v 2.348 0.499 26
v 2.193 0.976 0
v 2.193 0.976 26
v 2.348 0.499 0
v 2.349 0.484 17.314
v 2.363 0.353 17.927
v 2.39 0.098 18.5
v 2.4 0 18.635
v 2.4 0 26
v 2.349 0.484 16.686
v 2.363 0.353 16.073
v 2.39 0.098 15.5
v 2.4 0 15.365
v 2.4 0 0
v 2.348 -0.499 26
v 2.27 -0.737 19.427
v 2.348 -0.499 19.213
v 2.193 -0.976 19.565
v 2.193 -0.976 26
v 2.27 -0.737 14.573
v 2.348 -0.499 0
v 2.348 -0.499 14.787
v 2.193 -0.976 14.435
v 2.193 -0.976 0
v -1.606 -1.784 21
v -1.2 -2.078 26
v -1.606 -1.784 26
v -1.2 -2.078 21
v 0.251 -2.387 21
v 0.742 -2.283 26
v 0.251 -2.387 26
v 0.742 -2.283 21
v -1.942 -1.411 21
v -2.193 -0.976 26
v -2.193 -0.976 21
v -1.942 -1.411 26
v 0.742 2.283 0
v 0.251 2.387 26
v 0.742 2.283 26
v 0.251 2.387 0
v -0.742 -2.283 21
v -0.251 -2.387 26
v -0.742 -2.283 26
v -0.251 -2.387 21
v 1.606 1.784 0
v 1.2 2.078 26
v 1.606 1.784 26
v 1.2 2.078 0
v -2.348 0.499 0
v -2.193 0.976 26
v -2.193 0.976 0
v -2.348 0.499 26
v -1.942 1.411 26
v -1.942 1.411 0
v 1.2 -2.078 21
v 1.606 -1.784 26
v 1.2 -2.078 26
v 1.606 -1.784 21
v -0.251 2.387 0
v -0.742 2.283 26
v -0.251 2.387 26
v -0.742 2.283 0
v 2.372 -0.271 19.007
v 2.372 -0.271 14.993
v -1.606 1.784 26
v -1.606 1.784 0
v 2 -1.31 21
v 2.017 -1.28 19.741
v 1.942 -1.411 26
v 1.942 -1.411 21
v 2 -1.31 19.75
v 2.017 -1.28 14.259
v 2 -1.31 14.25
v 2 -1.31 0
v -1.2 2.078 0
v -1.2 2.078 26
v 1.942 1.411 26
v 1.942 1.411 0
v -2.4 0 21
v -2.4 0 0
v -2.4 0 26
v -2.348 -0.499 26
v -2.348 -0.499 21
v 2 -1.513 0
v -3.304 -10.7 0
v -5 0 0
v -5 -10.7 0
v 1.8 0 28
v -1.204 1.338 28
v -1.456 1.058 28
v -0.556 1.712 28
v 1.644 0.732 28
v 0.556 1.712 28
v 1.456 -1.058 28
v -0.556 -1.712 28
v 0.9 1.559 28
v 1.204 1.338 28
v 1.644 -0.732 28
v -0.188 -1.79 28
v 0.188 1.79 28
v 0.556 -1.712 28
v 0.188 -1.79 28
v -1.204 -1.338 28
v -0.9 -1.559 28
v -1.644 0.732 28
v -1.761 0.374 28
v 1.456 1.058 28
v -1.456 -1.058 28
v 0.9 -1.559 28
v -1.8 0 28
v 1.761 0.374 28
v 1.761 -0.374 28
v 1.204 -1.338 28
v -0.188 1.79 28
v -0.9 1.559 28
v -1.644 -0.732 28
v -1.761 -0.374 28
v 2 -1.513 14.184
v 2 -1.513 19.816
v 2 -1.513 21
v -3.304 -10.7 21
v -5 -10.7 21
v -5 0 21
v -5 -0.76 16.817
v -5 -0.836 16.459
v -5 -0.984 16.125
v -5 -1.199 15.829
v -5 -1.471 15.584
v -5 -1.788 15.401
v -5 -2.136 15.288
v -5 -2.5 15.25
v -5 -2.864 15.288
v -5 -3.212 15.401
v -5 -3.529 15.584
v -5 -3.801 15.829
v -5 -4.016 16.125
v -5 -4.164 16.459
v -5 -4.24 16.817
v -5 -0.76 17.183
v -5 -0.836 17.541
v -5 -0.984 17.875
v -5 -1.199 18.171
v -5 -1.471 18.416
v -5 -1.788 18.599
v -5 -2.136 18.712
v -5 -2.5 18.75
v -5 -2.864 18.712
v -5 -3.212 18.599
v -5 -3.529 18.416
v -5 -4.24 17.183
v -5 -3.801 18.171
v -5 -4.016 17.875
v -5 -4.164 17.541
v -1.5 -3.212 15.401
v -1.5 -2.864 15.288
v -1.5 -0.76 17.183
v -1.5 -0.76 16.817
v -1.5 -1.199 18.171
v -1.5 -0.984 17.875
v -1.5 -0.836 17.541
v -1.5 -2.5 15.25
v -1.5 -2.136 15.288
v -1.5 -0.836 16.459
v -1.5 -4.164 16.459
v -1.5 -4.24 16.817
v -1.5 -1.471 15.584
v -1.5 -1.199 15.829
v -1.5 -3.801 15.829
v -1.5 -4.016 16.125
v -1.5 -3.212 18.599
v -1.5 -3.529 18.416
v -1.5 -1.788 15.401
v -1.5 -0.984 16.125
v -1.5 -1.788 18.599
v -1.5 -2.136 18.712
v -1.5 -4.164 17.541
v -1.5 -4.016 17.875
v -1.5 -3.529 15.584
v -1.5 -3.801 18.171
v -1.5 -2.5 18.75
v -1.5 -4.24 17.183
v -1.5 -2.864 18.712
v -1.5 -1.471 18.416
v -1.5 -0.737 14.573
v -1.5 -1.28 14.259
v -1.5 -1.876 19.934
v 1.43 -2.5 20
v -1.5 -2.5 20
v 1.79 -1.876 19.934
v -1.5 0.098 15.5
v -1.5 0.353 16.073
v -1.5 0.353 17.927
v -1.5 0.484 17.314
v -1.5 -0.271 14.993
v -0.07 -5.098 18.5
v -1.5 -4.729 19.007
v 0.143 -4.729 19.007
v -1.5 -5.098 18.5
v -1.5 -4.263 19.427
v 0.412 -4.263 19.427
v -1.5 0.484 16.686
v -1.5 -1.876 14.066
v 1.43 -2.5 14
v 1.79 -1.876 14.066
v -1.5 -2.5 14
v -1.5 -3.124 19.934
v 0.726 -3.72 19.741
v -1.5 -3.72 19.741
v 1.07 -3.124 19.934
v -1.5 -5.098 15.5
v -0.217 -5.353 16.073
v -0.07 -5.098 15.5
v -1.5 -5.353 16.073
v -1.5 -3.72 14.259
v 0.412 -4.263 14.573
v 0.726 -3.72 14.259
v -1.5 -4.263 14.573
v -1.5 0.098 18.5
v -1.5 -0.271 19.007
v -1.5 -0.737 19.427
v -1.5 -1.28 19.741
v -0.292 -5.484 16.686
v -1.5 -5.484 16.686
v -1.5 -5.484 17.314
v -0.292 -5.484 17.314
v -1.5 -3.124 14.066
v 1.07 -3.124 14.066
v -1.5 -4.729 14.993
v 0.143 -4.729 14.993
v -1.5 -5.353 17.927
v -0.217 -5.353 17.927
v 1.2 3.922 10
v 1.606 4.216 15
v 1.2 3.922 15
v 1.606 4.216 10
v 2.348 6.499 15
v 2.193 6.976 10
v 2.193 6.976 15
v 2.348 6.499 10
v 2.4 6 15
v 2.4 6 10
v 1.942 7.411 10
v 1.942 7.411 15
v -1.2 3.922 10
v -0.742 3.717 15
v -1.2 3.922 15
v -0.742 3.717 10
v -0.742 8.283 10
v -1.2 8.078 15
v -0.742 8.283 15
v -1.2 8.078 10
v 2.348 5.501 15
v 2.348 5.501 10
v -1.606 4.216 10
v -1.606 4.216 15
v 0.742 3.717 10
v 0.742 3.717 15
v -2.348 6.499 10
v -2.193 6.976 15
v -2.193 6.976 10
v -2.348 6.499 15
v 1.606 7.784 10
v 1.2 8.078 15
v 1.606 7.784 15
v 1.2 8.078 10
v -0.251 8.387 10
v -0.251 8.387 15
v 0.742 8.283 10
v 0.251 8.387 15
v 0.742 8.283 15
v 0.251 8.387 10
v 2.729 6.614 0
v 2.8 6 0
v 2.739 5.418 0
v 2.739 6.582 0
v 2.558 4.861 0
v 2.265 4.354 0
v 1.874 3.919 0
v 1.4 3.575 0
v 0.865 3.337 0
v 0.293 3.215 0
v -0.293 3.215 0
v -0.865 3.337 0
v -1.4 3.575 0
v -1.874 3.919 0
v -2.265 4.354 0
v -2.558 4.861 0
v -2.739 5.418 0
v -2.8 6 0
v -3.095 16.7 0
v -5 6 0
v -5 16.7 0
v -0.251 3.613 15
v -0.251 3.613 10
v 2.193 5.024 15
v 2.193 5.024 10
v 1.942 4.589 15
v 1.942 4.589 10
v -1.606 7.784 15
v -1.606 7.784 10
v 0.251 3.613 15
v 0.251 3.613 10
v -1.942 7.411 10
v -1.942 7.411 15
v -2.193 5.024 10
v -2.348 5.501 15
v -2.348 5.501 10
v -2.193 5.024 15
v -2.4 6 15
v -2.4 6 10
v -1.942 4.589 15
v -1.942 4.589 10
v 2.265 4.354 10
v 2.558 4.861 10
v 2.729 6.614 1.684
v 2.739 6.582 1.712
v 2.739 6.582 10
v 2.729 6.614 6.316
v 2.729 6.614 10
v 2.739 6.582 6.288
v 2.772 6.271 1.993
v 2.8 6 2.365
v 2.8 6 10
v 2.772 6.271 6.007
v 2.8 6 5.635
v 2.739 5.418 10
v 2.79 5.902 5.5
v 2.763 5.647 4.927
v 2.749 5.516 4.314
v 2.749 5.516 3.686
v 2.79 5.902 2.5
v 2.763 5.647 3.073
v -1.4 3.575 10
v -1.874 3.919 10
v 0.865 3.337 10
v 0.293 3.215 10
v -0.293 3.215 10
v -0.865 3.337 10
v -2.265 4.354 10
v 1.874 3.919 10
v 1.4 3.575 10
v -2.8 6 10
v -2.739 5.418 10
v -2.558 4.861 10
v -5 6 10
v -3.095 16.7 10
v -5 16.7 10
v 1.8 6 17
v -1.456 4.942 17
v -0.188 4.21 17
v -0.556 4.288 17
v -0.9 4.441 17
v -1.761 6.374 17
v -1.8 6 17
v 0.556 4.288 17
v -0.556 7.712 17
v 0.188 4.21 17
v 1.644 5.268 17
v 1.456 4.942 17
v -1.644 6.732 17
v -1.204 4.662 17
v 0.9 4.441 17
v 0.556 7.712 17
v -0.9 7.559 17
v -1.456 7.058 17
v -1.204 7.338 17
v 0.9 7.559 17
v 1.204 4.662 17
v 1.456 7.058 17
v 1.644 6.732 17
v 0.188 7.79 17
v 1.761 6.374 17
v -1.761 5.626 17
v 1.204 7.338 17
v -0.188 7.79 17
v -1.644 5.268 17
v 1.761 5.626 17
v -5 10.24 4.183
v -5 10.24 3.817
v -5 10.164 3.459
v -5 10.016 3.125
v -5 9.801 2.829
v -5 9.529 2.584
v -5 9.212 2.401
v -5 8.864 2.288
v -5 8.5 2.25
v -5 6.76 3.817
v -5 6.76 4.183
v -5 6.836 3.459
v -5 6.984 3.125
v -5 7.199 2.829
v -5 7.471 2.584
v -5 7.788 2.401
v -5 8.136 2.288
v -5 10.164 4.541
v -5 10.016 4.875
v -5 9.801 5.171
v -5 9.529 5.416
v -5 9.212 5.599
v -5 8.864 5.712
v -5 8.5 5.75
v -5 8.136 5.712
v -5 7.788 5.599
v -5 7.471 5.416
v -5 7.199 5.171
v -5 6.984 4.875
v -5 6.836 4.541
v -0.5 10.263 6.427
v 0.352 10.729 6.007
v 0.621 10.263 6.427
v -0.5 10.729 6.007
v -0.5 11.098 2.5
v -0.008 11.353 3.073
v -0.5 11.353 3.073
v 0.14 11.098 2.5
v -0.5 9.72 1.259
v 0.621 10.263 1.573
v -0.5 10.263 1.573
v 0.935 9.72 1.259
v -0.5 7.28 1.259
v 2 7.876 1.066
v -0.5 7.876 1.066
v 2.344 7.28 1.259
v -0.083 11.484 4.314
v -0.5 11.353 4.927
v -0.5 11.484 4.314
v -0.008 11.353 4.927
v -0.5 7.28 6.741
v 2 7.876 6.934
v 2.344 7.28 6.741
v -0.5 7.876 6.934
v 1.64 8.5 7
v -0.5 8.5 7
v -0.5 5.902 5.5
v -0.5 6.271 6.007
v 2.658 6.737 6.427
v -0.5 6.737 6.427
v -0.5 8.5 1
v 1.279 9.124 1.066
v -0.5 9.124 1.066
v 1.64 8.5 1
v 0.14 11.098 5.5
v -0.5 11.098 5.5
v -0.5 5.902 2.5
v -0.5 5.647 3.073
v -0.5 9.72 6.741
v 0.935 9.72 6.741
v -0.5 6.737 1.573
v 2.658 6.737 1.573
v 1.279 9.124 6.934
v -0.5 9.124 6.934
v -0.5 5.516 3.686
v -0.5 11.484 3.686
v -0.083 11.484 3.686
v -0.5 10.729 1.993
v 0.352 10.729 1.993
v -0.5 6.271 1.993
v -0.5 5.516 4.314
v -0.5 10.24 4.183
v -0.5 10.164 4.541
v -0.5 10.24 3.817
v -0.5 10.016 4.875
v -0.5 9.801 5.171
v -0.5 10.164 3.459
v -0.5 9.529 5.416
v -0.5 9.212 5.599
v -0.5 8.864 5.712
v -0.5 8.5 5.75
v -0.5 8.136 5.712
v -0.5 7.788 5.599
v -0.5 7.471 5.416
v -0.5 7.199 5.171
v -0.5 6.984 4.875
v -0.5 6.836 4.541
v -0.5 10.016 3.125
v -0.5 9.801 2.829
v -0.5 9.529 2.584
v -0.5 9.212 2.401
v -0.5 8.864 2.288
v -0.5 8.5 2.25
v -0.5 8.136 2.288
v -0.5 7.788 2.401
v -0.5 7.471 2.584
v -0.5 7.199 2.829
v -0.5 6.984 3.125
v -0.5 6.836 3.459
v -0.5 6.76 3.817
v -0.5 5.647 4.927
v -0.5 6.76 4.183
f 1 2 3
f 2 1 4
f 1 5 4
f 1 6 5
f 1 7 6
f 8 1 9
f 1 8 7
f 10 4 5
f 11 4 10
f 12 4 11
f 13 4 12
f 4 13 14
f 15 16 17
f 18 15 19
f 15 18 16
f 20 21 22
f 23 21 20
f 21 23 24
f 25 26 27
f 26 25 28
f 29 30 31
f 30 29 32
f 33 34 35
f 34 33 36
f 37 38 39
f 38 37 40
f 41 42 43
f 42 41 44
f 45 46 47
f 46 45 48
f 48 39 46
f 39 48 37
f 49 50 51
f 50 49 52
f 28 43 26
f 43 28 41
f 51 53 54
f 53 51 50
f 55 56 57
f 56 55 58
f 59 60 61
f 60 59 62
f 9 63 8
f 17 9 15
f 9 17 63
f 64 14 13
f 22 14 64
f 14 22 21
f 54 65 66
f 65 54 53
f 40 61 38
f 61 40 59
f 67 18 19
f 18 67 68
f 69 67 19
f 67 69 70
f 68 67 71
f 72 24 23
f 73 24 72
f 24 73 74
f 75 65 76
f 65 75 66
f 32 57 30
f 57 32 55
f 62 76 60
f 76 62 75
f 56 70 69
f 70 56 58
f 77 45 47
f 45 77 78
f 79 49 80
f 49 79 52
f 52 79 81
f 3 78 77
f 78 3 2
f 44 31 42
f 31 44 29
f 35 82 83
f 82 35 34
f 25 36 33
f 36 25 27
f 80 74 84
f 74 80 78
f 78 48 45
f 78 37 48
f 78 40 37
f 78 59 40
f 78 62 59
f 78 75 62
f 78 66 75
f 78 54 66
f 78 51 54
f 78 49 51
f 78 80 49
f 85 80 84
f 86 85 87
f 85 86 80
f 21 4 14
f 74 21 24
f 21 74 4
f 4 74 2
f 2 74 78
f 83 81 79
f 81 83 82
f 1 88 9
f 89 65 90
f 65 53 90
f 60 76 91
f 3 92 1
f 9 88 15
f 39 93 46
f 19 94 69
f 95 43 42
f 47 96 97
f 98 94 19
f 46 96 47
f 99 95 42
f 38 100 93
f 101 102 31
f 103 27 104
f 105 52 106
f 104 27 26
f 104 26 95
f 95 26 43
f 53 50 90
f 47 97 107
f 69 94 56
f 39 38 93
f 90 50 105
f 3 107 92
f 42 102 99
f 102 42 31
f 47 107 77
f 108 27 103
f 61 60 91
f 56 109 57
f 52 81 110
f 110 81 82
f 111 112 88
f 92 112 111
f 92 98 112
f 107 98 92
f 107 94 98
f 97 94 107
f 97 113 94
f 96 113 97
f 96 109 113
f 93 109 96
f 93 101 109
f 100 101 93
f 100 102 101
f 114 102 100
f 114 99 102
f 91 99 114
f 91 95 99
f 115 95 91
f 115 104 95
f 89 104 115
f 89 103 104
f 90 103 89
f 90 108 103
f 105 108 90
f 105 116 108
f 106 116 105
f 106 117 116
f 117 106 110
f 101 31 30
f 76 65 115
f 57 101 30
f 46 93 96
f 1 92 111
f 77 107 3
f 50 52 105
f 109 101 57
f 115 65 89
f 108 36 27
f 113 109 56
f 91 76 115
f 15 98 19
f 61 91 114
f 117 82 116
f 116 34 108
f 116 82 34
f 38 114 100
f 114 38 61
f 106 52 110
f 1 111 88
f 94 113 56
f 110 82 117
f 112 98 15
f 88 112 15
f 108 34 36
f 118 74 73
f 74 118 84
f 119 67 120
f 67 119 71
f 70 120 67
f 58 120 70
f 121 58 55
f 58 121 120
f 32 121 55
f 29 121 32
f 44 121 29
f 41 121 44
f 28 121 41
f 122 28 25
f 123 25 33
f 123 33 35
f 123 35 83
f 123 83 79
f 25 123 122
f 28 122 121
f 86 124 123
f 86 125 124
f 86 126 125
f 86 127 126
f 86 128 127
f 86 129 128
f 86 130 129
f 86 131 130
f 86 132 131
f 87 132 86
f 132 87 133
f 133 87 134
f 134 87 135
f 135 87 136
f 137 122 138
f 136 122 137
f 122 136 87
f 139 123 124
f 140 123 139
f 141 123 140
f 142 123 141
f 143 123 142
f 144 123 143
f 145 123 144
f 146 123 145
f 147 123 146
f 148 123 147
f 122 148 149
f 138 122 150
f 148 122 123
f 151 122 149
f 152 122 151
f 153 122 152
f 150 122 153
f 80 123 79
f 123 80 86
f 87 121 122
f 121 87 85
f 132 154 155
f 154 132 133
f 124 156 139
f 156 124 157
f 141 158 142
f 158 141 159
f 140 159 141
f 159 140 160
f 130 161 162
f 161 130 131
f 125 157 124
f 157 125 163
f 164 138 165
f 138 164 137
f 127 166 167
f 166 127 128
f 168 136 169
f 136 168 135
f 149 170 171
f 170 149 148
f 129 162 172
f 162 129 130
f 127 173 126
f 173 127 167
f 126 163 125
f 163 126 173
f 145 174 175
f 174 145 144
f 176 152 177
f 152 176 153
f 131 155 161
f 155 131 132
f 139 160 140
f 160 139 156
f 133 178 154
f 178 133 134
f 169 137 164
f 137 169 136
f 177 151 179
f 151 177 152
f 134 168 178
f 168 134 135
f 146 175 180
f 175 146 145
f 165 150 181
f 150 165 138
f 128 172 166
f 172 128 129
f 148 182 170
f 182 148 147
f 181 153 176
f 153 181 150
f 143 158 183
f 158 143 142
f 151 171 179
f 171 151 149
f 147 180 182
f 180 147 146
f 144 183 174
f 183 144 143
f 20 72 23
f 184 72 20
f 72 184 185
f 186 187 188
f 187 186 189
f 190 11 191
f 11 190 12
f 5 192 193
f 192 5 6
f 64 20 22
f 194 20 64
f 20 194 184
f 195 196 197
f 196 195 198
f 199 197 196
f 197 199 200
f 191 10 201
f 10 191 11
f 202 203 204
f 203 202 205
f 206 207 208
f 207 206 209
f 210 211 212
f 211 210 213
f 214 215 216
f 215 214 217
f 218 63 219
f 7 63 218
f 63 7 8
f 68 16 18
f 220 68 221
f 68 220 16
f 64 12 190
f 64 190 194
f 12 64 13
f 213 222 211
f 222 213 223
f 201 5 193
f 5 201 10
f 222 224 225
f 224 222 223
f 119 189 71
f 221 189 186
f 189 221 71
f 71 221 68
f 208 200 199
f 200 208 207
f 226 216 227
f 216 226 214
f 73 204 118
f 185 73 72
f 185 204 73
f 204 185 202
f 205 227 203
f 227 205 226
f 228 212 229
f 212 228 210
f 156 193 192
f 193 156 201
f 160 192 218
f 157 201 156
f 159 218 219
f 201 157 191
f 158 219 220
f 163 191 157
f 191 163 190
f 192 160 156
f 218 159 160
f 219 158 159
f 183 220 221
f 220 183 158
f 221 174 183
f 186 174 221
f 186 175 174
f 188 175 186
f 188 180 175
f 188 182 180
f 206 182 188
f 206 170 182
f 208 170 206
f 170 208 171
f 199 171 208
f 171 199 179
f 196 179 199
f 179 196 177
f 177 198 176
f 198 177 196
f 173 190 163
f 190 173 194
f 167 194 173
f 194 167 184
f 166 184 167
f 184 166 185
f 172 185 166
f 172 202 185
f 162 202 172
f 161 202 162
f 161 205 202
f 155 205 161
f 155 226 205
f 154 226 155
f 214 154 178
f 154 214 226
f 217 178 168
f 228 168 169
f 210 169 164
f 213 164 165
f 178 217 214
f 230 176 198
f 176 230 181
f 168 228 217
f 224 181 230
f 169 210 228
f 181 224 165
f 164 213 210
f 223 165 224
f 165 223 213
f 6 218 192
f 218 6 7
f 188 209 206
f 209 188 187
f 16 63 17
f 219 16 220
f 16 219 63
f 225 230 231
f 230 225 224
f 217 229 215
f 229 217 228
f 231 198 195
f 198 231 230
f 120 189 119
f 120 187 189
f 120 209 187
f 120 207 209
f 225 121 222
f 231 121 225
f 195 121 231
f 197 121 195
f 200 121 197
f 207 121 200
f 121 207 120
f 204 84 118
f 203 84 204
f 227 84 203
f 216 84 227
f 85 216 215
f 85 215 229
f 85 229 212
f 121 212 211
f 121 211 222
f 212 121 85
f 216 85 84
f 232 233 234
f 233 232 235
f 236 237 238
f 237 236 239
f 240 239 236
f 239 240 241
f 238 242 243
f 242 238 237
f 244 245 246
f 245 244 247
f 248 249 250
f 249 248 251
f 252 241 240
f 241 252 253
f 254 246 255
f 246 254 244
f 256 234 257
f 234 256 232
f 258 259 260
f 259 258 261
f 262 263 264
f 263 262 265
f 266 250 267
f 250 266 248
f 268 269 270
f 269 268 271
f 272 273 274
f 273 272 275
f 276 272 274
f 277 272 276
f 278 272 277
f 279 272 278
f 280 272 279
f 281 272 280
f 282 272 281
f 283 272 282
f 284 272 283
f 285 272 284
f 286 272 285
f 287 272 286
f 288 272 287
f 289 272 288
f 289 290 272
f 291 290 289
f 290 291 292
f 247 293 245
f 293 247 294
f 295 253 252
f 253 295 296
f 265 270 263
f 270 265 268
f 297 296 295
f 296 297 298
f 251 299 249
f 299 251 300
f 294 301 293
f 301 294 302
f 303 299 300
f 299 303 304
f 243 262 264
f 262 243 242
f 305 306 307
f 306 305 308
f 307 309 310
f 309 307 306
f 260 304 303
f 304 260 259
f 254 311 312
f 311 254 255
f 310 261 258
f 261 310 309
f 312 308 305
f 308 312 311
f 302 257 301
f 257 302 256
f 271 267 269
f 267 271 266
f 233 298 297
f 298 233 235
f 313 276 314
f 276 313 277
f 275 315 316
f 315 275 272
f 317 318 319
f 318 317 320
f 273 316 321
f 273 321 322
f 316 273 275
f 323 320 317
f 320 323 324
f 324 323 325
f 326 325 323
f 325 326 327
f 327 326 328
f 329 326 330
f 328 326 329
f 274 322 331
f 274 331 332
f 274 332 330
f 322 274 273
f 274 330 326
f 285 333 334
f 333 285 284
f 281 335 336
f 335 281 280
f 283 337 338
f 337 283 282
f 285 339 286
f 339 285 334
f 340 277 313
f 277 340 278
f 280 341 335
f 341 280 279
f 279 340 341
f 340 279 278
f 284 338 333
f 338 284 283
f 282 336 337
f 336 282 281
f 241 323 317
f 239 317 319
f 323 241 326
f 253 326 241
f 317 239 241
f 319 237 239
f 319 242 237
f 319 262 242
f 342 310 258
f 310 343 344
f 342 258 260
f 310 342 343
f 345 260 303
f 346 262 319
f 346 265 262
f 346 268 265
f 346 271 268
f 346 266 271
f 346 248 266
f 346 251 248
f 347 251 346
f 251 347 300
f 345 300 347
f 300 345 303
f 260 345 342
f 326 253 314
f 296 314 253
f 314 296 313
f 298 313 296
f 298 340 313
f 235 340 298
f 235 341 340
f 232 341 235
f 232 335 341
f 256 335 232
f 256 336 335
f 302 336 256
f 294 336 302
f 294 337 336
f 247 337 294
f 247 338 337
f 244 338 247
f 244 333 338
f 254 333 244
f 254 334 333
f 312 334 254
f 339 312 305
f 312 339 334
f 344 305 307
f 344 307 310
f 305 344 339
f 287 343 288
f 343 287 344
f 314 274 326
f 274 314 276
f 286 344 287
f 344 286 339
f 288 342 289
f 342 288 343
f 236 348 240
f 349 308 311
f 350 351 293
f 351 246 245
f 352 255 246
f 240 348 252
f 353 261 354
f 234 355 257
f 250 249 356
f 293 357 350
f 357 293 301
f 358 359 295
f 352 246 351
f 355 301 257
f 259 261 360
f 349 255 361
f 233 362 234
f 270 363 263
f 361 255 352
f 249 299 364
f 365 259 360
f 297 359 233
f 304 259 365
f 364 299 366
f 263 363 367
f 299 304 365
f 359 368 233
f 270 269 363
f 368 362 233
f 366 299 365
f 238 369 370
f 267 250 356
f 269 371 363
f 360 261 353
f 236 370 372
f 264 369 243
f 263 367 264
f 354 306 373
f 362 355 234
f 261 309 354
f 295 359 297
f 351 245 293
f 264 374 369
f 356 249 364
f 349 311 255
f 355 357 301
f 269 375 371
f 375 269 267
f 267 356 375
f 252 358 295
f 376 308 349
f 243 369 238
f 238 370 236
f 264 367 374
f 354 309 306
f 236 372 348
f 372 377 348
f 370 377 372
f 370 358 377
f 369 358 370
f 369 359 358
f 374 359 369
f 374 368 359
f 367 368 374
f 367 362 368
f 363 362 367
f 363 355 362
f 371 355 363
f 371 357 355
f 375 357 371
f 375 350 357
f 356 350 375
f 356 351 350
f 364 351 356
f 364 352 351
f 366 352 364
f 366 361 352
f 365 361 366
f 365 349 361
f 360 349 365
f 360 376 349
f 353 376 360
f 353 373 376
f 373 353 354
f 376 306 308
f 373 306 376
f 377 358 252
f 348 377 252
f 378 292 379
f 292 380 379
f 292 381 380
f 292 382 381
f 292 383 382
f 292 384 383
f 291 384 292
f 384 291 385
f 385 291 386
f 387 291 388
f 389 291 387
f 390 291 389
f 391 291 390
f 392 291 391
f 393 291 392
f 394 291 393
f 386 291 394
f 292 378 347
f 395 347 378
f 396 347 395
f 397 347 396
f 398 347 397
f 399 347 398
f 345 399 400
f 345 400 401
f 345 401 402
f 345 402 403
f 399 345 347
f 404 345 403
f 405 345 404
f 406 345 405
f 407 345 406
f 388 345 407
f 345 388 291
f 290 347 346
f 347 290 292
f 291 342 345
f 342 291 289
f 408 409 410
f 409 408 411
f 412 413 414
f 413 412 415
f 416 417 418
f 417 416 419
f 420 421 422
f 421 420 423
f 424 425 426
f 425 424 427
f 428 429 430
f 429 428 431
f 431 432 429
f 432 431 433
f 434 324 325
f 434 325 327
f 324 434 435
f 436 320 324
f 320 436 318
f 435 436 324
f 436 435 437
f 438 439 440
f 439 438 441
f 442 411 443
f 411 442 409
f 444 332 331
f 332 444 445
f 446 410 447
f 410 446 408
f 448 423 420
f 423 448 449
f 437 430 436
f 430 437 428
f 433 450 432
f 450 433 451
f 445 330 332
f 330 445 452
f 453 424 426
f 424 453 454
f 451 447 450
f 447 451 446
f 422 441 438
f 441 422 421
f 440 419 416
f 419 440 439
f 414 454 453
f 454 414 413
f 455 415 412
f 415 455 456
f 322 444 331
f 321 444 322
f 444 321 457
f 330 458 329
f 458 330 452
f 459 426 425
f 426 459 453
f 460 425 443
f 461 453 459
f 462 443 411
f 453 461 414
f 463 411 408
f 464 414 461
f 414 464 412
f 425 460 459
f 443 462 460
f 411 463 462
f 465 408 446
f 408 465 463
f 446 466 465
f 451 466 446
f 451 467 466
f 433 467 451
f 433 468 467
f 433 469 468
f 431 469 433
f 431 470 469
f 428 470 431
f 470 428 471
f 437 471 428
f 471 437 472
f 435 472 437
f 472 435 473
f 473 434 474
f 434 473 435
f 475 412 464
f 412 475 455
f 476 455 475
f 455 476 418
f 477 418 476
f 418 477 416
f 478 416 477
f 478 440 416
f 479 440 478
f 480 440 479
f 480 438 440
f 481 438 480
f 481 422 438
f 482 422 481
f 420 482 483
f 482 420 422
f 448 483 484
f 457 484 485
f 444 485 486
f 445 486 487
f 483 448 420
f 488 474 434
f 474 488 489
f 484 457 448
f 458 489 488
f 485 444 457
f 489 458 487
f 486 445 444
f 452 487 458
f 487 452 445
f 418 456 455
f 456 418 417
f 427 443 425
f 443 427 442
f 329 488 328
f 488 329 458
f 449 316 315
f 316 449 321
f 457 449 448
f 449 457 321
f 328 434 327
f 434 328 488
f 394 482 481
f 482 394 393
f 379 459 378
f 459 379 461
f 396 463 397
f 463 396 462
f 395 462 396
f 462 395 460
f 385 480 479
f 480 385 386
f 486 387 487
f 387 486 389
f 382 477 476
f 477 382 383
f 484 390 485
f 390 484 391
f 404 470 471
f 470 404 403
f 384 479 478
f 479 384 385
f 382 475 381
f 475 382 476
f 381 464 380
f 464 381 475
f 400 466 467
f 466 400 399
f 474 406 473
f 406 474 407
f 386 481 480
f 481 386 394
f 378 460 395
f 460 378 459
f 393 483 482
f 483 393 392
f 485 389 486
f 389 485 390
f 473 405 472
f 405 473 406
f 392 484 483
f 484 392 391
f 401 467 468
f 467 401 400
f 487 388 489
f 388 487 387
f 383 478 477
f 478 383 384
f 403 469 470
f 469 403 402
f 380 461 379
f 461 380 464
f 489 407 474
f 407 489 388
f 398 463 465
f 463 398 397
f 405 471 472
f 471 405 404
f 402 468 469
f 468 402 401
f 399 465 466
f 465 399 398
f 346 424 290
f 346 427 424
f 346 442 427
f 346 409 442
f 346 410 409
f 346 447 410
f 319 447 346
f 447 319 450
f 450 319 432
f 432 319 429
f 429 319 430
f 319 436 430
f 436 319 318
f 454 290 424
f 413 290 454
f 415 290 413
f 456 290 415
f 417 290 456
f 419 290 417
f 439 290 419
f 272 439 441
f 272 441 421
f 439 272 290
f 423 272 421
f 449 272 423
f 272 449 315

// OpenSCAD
// PRUSA iteration4
// Einsy cover hinges
// GNU GPL v3
// Josef Průša <iam@josefprusa.cz> and contributors
// http://www.reprap.org/wiki/Prusa_Mendel
// http://prusamendel.org

module upper_hinge() {
  difference() {
    union() {
      // body
      cylinder(h=26, r=2.4, $fn=30);
      translate([0, 0, 26]) cylinder(h=2, r1=2.4, r2=1.8, $fn=30);
      translate([-5, -10.7, 0]) cube([7, 10.7, 21]);
    }
    // M3 screw hole
    translate([-12.5, -2.5, 17]) rotate([0, 90, 0]) cylinder(h=20, r=1.75, $fn=30);
    translate([-1.5, -2.5, 17]) rotate([0, 90, 0]) cylinder(h=9, r=3, $fn=30);
    // angle cut
    translate([-2.9, -20, -1]) rotate([0, 0, 60]) cube([25, 5, 26]);
  }
}

module lower_hinge() {
  difference() {
    union() {
      // body   
      translate([0, 6, 0]) cylinder(h=15, r=2.4, $fn=30);
      translate([0, 6, 0]) cylinder(h=10, r=2.8, $fn=30);
      translate([0, 6, 15]) cylinder(h=2, r1=2.4, r2=1.8, $fn=30);
      translate([-5, 6, 0]) cube([7, 10.7, 10]);
    }
    // M3 screw
    translate([-0.5, 8.5, 4]) rotate([0, 90, 0]) cylinder(h=20, r=3, $fn=30);
    translate([-12, 8.5, 4]) rotate([0, 90, 0]) cylinder(h=20, r=1.75, $fn=30);
    // angle cut
    translate([-5, 20, -1]) rotate([0, 0, -60]) cube([20, 5, 20]);
  }
}

upper_hinge();
lower_hinge();
